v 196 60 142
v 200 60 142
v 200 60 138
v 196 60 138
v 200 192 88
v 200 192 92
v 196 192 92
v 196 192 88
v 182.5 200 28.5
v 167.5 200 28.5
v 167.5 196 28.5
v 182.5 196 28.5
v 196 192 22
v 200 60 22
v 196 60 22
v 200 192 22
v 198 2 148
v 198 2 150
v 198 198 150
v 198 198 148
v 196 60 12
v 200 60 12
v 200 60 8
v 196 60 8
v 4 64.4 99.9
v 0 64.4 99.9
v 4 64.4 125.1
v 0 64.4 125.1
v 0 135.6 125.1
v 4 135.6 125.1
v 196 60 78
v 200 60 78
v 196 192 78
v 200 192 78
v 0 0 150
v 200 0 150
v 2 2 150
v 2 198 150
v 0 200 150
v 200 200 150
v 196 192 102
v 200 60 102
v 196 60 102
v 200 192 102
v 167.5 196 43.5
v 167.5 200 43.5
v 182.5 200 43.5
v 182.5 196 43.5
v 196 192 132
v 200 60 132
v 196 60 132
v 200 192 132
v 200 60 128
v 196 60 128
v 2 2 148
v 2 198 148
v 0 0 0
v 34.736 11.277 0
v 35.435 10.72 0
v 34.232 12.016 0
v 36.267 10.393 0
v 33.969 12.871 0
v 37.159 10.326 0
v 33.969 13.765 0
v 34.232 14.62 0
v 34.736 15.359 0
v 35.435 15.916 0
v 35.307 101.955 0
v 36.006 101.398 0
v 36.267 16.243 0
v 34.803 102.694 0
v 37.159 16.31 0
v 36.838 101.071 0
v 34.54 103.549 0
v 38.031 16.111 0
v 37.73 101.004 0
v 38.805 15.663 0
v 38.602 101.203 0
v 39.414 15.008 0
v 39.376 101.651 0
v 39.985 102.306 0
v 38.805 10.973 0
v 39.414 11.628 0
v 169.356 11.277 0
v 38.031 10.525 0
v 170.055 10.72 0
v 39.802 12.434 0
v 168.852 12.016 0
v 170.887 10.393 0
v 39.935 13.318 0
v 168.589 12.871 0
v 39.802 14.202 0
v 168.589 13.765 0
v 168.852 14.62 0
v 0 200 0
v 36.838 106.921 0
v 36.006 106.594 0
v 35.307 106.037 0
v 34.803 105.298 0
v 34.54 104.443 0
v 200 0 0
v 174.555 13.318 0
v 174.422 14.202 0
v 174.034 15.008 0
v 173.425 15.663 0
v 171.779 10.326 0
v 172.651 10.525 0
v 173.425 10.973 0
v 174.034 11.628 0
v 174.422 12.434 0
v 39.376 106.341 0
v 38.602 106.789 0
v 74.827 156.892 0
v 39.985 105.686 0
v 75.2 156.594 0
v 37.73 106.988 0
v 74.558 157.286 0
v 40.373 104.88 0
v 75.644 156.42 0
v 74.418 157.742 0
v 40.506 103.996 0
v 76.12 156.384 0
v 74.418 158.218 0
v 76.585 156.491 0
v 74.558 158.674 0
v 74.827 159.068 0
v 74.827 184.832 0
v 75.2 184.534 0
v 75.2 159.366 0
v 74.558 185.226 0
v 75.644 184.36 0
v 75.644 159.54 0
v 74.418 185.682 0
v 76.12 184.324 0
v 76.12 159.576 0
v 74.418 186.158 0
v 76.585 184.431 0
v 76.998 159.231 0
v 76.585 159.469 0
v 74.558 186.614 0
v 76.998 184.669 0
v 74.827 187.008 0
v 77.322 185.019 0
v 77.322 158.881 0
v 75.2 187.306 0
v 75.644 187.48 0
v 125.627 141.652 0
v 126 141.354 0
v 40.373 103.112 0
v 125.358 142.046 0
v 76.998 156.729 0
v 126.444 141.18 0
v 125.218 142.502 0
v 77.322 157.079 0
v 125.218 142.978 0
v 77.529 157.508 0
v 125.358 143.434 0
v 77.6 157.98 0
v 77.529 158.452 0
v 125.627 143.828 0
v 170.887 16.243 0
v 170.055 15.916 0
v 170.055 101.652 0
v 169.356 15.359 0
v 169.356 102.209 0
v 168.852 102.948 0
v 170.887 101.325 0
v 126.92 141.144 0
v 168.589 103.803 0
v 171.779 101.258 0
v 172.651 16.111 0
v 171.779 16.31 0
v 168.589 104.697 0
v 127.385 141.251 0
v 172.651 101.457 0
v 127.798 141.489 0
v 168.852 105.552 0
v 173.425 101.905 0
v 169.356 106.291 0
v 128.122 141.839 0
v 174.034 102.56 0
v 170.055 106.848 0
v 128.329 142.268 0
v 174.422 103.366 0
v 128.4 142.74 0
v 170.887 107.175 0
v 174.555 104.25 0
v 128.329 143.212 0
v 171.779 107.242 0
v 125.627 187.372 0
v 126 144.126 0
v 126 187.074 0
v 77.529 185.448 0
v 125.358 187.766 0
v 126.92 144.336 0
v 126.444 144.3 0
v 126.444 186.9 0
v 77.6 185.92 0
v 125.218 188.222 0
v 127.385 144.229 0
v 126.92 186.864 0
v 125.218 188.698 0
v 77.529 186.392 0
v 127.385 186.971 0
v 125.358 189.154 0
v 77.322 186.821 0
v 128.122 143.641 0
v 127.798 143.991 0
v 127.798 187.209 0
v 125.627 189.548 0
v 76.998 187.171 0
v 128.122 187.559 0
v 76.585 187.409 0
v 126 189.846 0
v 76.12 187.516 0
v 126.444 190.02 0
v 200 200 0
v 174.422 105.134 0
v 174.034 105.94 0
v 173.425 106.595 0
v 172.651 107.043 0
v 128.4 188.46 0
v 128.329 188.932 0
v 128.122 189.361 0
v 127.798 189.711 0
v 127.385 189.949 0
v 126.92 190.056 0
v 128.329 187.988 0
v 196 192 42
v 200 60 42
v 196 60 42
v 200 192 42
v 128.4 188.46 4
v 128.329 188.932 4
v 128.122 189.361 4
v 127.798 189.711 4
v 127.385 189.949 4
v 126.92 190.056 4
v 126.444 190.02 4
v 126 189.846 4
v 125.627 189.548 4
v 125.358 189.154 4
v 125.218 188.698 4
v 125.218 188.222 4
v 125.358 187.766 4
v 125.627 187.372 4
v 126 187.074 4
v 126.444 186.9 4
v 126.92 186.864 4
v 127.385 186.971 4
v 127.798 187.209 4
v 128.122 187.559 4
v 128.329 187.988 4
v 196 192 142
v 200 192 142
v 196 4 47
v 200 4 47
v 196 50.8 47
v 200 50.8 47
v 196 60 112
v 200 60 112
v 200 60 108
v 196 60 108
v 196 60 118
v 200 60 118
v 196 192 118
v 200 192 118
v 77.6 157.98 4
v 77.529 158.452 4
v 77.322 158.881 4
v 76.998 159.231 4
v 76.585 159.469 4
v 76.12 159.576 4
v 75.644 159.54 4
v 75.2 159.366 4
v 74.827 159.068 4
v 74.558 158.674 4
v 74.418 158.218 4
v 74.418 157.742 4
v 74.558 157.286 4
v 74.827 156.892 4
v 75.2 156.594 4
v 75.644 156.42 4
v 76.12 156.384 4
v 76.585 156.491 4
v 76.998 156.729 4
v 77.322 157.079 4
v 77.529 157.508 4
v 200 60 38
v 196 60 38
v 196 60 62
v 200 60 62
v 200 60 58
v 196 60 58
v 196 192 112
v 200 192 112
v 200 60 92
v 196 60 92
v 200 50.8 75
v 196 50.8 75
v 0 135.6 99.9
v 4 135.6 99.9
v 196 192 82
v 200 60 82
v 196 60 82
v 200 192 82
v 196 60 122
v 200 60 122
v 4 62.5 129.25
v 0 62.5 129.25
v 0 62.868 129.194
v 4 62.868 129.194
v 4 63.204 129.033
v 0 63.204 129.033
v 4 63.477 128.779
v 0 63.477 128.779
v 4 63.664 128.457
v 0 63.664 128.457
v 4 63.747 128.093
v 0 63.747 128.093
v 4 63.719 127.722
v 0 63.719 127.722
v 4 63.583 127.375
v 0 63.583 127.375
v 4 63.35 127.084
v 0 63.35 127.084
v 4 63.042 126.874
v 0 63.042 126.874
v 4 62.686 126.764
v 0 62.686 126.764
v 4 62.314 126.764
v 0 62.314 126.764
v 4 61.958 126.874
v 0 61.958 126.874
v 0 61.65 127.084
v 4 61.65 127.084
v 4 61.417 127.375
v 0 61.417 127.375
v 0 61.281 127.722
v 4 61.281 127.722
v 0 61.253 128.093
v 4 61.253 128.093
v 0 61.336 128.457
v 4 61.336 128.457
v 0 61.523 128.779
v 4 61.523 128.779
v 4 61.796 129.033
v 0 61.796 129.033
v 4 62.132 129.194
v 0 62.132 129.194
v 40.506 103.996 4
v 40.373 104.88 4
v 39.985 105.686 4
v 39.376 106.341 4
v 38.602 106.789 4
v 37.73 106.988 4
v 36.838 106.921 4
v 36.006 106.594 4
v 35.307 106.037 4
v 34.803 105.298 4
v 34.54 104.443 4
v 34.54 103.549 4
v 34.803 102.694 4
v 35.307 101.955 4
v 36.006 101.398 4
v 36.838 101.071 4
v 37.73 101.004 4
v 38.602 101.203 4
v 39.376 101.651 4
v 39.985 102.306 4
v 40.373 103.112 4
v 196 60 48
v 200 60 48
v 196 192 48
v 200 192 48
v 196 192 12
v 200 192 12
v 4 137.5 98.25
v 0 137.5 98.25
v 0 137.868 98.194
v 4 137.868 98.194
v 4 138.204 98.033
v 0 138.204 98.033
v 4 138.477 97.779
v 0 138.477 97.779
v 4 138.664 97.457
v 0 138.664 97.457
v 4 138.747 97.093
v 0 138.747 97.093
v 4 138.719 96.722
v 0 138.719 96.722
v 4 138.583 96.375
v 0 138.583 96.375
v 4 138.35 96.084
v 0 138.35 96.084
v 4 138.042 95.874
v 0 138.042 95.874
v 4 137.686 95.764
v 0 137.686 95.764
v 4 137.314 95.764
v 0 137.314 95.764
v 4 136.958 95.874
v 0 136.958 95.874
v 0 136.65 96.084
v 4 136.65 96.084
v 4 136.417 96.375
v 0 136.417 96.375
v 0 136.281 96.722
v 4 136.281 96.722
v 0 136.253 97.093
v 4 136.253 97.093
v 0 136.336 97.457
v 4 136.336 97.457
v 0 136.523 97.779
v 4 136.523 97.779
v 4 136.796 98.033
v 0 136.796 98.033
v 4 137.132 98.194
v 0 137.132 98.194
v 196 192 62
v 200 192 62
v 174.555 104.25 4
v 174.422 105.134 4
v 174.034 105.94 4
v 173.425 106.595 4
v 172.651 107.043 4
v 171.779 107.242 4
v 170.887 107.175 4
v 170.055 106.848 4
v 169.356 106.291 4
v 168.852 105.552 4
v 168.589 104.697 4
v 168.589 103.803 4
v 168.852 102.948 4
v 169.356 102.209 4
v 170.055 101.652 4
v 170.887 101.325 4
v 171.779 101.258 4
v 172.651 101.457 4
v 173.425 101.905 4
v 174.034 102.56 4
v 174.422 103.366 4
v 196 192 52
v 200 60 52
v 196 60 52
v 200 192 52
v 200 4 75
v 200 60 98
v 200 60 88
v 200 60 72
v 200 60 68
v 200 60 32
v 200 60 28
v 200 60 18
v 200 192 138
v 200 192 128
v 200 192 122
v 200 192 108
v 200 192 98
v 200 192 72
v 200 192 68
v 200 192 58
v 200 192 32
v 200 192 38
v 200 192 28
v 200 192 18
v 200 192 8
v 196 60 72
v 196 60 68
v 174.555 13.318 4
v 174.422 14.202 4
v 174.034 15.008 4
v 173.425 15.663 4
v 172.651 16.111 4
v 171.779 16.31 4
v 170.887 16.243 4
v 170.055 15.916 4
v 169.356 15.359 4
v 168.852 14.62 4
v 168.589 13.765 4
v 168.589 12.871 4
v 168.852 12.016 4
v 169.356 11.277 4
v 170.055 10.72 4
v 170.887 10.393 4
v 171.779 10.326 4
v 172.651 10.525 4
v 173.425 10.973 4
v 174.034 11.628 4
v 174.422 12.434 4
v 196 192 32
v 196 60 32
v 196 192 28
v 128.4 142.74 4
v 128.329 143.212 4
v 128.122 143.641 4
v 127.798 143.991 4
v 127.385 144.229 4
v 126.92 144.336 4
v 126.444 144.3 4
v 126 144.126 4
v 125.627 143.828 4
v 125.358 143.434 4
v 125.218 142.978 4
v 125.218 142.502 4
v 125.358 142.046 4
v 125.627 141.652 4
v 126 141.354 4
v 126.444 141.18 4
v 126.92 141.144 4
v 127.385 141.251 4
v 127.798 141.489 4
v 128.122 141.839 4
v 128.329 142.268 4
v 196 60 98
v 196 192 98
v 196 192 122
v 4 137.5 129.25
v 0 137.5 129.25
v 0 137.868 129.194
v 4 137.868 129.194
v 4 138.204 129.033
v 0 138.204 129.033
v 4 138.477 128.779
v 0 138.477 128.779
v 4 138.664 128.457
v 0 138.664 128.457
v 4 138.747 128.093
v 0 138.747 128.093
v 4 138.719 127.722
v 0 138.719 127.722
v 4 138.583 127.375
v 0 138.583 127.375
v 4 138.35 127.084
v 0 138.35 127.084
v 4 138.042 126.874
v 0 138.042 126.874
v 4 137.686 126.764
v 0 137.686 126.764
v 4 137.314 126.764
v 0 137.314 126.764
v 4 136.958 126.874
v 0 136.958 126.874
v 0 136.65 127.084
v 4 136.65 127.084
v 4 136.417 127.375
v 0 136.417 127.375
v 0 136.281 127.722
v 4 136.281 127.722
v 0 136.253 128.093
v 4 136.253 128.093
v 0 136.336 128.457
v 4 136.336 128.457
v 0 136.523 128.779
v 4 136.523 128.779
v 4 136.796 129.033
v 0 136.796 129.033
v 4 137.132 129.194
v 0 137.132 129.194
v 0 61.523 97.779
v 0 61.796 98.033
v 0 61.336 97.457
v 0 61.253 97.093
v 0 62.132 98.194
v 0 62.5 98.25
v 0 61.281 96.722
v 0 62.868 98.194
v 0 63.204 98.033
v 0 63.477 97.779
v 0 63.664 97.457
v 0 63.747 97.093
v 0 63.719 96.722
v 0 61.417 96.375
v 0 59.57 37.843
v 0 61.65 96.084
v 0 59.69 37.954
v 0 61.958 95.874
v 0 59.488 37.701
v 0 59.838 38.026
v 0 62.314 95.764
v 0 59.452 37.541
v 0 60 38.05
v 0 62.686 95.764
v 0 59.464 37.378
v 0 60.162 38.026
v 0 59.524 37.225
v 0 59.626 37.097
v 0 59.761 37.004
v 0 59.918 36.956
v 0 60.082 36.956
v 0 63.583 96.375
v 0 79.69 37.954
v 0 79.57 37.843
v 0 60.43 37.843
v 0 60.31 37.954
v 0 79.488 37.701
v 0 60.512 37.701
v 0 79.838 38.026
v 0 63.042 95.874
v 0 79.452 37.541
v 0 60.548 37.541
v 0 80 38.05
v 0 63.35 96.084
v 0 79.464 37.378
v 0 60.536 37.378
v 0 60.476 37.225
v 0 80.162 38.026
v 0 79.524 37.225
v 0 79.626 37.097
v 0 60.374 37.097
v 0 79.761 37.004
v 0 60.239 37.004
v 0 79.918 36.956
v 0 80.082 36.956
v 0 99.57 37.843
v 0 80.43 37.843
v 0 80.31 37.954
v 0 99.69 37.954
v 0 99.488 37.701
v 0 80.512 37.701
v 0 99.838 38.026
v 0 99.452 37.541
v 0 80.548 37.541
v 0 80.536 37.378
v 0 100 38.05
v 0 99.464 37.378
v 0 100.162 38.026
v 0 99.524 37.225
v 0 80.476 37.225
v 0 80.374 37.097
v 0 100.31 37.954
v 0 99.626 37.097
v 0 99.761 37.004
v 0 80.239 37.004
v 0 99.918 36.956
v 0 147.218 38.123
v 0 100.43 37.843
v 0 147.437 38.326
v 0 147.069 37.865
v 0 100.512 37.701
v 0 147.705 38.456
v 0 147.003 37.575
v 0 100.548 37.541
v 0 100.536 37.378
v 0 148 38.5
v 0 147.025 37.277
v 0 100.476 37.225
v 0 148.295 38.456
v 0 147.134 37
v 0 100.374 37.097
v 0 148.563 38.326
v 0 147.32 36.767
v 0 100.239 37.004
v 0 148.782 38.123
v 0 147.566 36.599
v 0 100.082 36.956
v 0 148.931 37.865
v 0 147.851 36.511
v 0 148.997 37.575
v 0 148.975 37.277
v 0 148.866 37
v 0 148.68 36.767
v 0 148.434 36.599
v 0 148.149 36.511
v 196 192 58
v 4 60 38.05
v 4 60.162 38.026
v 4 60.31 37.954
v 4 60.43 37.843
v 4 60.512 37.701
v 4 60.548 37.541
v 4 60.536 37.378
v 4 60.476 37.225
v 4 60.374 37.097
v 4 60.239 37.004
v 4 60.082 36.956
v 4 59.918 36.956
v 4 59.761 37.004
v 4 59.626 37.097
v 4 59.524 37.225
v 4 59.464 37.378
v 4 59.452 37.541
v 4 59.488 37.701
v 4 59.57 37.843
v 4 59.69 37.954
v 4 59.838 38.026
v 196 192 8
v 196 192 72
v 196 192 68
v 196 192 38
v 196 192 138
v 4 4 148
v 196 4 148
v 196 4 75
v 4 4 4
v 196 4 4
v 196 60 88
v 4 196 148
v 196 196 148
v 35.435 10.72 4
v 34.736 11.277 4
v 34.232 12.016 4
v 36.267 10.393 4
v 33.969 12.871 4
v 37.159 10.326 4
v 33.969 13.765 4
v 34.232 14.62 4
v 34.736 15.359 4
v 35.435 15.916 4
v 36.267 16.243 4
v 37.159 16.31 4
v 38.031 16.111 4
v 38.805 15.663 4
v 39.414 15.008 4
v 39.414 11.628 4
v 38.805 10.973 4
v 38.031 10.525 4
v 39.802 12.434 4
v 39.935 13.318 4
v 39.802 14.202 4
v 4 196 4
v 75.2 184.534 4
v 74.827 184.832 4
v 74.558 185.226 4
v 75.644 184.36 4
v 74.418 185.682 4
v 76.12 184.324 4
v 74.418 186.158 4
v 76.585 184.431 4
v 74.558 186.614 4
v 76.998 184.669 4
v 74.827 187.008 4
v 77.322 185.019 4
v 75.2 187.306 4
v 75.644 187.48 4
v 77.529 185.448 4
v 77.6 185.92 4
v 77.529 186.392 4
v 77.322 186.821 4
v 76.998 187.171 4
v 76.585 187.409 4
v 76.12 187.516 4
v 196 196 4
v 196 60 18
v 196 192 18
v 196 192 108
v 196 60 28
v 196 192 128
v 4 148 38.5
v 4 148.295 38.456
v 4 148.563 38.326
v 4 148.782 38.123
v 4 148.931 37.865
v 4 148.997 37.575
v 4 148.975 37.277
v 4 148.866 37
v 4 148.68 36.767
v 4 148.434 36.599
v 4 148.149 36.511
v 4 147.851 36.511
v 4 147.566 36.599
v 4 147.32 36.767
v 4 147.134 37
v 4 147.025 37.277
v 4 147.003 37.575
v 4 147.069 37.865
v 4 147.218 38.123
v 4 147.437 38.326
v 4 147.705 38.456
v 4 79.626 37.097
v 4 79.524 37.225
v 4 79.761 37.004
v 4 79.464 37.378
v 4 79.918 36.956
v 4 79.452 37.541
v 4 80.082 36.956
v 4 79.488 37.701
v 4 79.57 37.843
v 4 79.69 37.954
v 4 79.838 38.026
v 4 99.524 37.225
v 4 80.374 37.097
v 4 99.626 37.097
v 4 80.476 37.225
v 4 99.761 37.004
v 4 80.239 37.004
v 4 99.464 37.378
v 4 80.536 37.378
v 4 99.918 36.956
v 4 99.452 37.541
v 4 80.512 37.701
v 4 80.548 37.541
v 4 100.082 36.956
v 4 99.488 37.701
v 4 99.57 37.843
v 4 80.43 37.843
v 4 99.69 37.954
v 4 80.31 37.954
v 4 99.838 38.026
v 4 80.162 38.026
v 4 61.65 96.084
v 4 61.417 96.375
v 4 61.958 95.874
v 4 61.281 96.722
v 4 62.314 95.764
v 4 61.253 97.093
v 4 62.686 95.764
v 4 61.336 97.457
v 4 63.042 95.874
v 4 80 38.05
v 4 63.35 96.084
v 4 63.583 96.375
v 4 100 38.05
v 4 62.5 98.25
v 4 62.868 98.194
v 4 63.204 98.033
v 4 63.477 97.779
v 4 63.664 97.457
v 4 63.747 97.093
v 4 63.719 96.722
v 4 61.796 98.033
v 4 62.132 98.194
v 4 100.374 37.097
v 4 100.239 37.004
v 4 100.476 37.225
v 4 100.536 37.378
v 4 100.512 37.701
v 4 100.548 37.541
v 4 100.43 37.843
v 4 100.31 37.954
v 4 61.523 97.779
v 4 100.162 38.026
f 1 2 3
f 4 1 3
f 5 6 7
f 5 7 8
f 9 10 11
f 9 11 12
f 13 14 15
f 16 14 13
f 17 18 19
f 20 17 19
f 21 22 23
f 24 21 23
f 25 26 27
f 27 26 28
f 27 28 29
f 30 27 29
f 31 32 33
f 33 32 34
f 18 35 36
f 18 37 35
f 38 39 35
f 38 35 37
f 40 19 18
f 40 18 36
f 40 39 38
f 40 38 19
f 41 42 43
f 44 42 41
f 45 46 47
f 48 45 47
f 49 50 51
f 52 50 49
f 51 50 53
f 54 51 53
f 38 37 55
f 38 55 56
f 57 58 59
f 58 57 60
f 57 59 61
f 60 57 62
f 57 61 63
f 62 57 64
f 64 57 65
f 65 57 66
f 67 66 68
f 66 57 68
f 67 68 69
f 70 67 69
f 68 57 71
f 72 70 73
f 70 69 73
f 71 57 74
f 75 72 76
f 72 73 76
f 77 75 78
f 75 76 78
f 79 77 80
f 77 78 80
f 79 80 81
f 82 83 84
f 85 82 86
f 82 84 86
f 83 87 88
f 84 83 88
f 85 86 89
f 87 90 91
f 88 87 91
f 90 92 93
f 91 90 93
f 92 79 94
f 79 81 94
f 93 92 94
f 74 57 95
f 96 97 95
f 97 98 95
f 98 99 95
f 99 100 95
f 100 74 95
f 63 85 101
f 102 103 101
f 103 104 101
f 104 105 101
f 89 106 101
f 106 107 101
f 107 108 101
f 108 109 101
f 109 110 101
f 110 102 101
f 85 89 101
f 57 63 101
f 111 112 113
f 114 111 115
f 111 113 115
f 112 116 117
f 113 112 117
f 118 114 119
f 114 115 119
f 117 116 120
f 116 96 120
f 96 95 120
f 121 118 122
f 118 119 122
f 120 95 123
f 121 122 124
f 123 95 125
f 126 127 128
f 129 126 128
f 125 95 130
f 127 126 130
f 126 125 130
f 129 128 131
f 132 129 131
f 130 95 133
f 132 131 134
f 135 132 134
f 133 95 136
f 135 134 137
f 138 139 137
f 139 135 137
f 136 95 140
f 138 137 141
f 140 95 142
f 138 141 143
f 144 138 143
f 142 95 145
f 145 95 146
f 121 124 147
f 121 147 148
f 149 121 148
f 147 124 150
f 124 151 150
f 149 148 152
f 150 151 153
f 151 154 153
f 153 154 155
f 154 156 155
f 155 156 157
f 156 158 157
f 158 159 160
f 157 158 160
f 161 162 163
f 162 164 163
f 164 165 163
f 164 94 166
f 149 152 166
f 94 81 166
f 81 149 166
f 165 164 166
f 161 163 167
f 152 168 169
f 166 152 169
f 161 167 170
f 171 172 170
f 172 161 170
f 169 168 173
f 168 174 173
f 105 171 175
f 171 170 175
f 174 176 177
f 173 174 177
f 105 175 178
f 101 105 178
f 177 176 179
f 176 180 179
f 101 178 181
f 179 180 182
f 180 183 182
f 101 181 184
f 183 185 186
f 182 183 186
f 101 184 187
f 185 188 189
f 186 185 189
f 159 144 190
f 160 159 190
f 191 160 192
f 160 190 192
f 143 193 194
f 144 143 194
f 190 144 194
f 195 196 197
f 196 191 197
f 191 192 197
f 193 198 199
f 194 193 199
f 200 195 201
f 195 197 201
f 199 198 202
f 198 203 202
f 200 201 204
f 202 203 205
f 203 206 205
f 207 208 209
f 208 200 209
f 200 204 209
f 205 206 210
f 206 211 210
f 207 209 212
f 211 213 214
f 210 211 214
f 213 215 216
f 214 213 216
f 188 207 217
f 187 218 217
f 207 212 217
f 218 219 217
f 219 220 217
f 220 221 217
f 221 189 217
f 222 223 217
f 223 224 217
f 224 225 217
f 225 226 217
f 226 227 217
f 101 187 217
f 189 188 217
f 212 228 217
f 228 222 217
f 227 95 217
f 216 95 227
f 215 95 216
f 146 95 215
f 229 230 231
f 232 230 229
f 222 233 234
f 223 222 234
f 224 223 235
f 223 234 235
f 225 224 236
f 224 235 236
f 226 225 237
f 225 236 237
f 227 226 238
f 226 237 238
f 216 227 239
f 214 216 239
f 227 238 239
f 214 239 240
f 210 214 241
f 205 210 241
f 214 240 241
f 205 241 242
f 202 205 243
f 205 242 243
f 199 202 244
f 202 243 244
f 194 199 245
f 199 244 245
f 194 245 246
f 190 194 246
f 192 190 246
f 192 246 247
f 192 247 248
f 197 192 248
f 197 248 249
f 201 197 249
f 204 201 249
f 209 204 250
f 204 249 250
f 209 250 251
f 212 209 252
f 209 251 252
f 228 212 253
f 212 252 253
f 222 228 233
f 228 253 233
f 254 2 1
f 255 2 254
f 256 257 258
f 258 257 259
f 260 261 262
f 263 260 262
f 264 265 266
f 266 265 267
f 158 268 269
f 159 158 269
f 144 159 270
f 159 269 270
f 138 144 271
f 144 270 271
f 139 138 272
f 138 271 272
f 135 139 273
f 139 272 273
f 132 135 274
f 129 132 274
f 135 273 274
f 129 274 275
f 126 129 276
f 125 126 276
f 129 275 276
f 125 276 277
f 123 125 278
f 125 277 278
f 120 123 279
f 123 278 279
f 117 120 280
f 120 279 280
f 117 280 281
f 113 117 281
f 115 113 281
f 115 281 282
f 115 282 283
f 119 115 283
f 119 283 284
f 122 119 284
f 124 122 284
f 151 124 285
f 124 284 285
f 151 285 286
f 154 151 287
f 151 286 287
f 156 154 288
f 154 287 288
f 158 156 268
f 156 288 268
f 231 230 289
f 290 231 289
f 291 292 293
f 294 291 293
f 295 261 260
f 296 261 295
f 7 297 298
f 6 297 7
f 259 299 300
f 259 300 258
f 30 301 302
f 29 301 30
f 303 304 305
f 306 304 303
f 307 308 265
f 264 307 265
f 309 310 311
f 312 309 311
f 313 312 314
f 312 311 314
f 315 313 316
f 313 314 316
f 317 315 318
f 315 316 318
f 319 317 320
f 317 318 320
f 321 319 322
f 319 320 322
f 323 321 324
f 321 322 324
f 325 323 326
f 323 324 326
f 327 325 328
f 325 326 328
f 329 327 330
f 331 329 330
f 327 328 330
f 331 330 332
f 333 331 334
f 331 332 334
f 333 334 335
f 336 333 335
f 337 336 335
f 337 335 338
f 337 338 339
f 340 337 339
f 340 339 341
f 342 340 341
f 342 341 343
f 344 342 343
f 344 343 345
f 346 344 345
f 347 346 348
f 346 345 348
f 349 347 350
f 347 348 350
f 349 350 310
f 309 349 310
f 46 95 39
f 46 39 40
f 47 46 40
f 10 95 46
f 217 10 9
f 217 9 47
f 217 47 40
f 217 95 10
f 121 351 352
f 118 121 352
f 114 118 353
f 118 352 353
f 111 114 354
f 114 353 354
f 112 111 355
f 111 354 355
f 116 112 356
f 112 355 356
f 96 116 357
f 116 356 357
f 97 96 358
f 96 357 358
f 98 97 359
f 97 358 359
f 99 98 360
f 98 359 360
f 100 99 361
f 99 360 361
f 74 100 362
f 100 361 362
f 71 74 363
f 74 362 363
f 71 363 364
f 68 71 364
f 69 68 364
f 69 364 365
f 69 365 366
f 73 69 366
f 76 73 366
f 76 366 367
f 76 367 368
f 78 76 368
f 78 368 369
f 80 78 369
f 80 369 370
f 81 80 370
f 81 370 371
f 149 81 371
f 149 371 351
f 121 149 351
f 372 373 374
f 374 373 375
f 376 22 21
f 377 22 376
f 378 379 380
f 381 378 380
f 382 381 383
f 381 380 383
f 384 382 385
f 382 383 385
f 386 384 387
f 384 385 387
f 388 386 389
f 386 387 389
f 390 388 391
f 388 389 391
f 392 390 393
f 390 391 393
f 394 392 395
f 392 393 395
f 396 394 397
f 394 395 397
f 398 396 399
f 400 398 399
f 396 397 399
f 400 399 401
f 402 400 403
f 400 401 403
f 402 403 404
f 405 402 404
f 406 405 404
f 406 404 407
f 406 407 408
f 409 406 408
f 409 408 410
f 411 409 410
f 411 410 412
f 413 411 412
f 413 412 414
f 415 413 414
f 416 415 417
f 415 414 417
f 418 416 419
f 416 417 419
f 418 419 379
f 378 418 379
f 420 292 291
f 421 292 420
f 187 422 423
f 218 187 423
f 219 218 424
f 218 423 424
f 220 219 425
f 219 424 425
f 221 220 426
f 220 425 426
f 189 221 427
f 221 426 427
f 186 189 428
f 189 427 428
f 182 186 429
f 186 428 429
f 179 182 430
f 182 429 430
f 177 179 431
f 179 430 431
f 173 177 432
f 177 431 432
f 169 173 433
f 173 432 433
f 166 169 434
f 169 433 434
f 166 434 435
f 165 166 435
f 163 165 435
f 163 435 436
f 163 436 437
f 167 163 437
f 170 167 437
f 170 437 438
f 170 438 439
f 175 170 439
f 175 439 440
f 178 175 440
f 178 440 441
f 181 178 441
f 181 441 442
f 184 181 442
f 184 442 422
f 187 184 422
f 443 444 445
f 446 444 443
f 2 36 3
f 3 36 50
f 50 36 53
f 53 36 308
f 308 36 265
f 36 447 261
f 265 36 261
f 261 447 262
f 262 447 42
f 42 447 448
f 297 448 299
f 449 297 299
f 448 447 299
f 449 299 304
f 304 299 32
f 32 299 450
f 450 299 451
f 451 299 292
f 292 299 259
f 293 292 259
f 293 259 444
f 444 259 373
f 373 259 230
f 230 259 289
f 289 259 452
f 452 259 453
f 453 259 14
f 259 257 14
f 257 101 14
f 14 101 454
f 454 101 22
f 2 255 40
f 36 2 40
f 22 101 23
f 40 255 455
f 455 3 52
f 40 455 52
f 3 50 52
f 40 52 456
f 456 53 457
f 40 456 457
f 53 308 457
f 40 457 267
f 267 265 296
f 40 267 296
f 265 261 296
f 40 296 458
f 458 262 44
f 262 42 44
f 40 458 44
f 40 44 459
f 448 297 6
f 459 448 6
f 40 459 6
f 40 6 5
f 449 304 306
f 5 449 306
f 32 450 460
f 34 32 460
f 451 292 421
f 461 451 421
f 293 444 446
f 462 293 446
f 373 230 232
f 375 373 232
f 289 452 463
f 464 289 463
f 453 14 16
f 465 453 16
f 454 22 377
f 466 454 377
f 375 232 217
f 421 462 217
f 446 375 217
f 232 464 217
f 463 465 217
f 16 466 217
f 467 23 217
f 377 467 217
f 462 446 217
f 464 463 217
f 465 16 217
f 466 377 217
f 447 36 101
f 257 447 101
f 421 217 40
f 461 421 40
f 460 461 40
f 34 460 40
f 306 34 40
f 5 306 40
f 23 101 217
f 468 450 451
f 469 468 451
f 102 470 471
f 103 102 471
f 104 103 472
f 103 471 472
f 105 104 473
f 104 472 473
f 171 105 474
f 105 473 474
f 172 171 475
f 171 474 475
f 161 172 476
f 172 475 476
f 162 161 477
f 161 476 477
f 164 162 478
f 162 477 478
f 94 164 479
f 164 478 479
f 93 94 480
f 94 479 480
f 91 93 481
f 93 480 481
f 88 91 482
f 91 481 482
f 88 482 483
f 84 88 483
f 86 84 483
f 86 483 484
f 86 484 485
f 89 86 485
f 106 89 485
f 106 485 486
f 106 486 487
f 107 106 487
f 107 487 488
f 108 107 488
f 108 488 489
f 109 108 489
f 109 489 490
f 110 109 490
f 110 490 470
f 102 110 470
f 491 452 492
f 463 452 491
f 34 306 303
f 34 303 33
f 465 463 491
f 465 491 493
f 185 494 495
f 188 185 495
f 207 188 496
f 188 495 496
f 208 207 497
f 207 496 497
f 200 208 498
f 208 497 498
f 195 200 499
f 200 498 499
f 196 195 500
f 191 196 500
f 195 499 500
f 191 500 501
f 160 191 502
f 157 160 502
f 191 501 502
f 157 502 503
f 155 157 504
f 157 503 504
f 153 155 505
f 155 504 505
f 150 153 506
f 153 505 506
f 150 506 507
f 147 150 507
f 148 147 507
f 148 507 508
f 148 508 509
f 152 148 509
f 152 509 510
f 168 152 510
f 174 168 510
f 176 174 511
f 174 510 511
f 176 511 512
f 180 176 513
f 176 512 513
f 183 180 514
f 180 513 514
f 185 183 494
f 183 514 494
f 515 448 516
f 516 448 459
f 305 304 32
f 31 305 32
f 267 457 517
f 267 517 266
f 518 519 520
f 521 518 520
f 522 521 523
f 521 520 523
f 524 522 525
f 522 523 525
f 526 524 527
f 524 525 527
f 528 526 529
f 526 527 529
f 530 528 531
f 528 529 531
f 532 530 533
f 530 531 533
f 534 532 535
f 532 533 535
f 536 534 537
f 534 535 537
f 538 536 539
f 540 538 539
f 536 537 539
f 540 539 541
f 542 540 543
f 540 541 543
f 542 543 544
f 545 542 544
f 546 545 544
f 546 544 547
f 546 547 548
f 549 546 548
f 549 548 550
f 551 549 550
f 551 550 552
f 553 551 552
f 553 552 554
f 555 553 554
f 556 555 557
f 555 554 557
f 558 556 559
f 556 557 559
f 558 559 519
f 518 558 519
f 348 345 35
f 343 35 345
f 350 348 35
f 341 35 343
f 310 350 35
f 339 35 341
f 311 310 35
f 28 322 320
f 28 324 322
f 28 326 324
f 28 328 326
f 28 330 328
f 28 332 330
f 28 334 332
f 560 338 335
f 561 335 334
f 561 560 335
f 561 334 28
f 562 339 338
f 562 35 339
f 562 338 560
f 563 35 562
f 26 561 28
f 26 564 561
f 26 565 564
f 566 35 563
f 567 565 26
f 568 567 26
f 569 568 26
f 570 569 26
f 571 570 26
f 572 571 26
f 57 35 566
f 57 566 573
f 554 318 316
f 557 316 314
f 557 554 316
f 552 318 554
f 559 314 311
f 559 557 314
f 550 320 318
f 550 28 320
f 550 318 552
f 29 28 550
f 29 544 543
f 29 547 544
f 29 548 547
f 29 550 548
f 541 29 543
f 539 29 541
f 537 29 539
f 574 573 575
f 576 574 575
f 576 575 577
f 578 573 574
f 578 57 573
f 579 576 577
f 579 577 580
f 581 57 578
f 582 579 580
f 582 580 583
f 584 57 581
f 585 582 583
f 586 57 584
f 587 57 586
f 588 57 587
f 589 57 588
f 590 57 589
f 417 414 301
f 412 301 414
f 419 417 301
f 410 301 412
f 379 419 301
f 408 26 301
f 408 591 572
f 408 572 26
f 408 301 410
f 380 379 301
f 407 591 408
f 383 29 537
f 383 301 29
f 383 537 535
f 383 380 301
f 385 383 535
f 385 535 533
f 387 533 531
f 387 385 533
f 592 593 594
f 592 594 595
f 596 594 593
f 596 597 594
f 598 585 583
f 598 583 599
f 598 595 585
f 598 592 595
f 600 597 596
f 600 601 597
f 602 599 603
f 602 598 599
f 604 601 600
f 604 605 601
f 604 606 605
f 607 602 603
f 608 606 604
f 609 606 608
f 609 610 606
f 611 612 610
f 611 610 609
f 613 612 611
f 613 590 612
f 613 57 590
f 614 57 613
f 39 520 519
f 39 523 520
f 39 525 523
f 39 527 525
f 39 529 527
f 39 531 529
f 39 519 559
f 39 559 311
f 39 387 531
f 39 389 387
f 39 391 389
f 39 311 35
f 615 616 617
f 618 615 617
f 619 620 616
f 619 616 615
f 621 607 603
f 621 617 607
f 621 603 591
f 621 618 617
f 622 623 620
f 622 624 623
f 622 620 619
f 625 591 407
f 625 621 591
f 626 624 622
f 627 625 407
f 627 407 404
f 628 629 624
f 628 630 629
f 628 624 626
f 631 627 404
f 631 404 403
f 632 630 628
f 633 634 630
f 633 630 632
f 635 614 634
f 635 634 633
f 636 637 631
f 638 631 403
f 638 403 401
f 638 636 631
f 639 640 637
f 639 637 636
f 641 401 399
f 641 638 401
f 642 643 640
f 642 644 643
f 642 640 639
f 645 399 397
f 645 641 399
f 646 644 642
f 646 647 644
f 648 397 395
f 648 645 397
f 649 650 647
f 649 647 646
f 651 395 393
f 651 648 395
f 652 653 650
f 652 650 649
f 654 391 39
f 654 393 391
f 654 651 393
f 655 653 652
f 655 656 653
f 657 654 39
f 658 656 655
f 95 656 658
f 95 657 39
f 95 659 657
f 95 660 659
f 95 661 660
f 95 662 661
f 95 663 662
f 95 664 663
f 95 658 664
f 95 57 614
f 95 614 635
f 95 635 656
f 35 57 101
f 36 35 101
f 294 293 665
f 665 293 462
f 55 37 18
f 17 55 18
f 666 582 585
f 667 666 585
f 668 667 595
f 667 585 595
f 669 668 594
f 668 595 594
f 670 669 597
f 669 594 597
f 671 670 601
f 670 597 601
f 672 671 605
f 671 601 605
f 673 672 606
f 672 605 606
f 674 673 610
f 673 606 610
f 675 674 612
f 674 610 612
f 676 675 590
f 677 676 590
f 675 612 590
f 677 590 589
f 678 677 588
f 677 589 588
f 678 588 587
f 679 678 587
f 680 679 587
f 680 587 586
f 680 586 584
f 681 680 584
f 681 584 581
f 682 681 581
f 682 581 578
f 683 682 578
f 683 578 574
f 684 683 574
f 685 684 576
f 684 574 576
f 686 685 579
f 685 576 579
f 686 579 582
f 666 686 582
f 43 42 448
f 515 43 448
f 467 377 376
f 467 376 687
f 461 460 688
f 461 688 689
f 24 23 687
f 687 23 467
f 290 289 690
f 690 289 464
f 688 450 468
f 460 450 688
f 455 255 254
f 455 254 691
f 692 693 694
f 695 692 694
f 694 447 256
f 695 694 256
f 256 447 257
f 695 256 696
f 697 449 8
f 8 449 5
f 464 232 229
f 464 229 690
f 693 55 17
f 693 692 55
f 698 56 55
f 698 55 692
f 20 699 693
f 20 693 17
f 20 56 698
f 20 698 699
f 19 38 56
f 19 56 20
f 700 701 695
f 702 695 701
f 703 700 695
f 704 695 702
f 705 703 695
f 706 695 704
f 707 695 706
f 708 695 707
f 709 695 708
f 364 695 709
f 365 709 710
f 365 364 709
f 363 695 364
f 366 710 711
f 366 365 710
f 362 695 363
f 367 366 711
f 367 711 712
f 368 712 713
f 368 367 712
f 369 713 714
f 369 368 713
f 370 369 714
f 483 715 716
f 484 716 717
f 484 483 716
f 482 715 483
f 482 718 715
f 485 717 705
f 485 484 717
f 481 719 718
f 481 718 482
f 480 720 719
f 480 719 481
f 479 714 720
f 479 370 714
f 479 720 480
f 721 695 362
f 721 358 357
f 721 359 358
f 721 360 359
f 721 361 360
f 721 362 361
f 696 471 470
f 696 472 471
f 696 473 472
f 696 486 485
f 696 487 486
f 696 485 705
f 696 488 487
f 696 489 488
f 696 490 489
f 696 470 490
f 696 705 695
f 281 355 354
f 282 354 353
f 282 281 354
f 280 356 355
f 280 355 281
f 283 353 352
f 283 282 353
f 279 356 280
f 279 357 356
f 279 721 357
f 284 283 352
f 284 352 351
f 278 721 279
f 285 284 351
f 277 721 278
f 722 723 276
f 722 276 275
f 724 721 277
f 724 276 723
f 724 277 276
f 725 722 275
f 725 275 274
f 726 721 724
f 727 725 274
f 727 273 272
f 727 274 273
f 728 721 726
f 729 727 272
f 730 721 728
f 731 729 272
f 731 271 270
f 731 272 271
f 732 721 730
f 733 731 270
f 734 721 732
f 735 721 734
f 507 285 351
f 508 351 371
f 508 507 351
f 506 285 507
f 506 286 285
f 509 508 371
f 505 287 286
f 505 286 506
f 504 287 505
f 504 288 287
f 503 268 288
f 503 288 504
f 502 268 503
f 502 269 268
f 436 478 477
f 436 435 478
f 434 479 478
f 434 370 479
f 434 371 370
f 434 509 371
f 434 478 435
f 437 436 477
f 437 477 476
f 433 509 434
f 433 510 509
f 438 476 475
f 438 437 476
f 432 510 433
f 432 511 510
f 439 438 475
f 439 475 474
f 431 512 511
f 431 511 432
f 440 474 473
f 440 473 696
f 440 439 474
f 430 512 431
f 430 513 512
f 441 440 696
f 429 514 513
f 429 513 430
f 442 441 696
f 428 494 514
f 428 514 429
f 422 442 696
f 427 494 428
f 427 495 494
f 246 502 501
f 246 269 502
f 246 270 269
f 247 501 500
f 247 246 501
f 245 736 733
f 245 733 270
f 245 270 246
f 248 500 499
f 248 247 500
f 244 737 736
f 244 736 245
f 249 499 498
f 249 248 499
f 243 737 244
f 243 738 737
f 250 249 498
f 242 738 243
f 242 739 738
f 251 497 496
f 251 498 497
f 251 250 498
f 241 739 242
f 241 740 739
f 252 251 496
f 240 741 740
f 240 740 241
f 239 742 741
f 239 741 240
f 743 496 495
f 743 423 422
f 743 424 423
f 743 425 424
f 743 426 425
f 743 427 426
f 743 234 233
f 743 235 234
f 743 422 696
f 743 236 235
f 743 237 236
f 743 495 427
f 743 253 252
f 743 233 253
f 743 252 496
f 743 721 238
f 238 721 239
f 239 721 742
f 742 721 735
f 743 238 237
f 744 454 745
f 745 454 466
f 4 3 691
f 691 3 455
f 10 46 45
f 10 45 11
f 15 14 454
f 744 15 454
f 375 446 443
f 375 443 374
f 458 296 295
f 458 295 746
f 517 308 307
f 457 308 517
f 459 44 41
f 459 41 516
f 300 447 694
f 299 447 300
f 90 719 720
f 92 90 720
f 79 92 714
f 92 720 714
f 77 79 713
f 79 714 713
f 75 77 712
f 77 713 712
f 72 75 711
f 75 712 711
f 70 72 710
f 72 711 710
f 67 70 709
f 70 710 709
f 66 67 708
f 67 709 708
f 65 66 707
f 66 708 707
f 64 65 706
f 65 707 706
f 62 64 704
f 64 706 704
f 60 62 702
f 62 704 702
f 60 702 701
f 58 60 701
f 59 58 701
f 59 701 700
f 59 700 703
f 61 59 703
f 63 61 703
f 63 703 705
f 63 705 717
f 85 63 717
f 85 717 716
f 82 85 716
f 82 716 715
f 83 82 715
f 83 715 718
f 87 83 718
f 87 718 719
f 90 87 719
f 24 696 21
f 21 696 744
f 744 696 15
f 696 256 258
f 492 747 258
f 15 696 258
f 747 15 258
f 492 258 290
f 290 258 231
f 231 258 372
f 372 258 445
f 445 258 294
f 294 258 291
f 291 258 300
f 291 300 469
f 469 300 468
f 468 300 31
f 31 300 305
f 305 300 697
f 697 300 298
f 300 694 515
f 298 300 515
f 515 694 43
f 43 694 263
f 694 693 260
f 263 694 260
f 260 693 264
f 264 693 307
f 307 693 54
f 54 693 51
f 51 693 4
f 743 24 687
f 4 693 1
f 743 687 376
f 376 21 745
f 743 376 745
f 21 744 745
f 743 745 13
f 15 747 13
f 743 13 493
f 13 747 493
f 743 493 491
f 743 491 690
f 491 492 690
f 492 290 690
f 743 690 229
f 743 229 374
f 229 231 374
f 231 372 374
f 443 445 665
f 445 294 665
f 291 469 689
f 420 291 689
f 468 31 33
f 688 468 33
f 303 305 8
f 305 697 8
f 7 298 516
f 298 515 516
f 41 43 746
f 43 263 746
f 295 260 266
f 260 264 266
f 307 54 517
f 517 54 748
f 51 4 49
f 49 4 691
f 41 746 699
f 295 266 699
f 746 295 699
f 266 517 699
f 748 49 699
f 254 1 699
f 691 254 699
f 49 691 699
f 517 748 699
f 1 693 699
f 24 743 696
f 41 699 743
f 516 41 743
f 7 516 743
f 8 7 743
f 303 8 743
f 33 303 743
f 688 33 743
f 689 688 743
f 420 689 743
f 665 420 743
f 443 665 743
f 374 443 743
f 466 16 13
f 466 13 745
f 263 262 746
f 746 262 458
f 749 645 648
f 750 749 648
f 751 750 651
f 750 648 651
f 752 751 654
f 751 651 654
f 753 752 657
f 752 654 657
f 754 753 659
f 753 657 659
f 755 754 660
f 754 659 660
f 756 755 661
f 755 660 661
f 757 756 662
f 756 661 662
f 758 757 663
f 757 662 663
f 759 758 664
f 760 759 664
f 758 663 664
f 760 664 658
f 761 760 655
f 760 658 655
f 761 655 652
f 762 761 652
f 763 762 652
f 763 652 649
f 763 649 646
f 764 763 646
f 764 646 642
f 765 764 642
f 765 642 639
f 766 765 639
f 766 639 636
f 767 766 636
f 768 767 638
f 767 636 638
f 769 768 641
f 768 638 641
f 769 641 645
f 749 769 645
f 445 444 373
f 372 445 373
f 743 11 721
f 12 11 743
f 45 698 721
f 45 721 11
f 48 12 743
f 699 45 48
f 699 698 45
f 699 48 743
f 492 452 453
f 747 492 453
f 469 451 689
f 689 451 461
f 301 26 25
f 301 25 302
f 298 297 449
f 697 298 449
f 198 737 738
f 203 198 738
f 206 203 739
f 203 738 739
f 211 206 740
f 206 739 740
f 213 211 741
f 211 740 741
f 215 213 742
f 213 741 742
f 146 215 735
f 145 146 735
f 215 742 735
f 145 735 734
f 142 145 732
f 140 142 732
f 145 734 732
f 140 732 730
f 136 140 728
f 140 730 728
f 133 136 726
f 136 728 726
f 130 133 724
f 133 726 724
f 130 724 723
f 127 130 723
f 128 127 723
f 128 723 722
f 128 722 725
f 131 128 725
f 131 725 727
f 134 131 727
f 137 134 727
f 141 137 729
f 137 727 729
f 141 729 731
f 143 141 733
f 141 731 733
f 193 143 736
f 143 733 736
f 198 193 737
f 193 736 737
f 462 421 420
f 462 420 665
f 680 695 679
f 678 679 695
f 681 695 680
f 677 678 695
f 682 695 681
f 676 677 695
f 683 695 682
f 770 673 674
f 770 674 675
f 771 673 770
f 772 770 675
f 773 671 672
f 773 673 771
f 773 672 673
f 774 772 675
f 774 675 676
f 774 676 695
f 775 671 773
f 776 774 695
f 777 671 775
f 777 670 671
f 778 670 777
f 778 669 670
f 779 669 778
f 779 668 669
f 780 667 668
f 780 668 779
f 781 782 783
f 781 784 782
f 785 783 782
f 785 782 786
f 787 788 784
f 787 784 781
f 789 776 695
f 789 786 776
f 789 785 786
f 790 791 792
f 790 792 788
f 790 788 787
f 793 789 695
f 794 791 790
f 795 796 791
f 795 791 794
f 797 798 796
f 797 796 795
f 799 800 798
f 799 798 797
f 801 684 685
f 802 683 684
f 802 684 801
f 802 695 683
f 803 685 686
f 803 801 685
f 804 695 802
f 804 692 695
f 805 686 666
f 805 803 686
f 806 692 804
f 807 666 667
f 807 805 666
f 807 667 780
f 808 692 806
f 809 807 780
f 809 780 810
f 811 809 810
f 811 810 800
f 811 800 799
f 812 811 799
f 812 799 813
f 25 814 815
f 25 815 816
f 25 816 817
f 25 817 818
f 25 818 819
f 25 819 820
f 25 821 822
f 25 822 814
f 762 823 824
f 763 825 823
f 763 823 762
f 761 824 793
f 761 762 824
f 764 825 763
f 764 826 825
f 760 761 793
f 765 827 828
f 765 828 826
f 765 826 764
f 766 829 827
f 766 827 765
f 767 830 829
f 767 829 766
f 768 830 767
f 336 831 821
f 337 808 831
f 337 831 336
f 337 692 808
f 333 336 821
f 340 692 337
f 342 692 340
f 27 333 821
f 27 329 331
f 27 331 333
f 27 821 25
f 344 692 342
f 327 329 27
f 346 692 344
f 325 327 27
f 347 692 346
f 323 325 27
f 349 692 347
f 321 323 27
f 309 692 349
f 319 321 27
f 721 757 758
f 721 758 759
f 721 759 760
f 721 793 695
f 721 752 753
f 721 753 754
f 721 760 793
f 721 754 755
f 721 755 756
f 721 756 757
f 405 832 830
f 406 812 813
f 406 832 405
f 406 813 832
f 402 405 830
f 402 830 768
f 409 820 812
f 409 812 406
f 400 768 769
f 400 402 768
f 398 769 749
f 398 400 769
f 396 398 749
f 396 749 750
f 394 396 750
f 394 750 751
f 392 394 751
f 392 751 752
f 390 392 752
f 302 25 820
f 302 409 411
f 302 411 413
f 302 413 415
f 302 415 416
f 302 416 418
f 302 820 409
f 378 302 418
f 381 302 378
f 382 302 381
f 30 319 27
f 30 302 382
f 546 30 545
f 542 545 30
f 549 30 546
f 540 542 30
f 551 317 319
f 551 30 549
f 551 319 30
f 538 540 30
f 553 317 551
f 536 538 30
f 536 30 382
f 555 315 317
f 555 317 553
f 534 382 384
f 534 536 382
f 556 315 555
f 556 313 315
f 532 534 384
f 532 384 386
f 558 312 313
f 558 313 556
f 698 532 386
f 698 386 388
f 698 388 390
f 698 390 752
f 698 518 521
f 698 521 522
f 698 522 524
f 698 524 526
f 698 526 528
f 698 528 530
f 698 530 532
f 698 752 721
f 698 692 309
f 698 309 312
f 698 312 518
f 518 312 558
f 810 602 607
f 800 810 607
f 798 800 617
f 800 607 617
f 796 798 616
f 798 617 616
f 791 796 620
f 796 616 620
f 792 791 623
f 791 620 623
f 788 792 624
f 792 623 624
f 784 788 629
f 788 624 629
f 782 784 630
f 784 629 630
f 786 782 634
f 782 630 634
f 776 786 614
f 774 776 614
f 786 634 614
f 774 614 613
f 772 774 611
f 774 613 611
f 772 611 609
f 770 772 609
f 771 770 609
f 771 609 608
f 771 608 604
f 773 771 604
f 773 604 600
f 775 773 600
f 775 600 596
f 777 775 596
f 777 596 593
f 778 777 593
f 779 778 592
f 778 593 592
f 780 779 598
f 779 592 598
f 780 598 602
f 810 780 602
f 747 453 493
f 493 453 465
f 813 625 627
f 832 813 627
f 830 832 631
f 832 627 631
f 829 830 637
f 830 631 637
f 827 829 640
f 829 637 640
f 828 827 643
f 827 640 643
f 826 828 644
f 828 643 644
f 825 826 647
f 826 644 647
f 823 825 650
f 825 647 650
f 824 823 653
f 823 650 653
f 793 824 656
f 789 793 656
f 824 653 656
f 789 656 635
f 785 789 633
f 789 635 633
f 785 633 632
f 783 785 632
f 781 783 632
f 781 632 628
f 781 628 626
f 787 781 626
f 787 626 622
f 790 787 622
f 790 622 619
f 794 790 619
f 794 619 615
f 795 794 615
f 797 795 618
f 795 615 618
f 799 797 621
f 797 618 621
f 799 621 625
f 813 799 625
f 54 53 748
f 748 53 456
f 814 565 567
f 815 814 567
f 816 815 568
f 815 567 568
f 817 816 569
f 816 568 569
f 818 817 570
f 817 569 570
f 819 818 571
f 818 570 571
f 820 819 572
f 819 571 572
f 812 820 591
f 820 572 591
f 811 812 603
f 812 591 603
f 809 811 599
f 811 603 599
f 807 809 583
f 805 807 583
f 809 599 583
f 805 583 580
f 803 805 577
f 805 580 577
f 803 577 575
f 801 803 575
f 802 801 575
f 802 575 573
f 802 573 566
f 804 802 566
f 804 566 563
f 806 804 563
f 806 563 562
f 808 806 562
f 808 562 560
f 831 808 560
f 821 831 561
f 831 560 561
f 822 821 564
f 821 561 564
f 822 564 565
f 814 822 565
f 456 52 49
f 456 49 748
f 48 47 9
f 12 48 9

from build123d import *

# Parameters (mm, degrees)
SKETCH4_W                = 200
SKETCH4_H                = 200
BOSS_EXTRUDE1_DEPTH      = 150
SKETCH6_W                = 196
SKETCH6_H                = 196
CUT_EXTRUDE1_DEPTH       = 2
SKETCH7_W                = 192
SKETCH7_H                = 192
CUT_EXTRUDE2_DEPTH       = 92
SKETCH9_W                = 28
SKETCH9_H                = 46.8
INLET_DEPTH              = 4
SKETCH13_W               = 4
SKETCH13_H               = 132
AIRFLOW_DEPTH            = 4
SKETCH11_W               = 25.2
SKETCH11_H               = 71.2
CUT_EXTRUDE5_DEPTH       = 4
SKETCH11_4_R             = 1.25
LCD_MOUNTING_DEPTH       = 4
SKETCH12_R               = 0.55
SKETCH12_R_2             = 1
POST_KNOB_MOUNTING_DEPTH = 4
SKETCH14_R               = 3
CUT_EXTRUDE10_DEPTH      = 56
SKETCH17_W               = 192
SKETCH17_H               = 192
CUT_EXTRUDE11_DEPTH      = 52
SKETCH18_R               = 1.6
CUT_EXTRUDE12_DEPTH      = 4
SKETCH20_W               = 15
SKETCH20_H               = 15
CUT_EXTRUDE13_DEPTH      = 4


with BuildPart() as part:
    # Sketch4 → Boss-Extrude1 (new body)
    with BuildSketch(Plane.XY):
        with Locations((100, 100)):
            Rectangle(SKETCH4_W, SKETCH4_H)
    extrude(amount=BOSS_EXTRUDE1_DEPTH)

    # Sketch6 → Cut-Extrude1 (cut)
    with BuildSketch(Plane.XY.offset(150)):
        with Locations((100, 100)):
            Rectangle(SKETCH6_W, SKETCH6_H)
    extrude(amount=-CUT_EXTRUDE1_DEPTH, mode=Mode.SUBTRACT)

    # Sketch7 → Cut-Extrude2 (cut)
    with BuildSketch(Plane.XY.offset(148)):
        with Locations((100, 100)):
            Rectangle(SKETCH7_W, SKETCH7_H)
    extrude(amount=-CUT_EXTRUDE2_DEPTH, mode=Mode.SUBTRACT)

    # Sketch9 → Inlet (cut)
    with BuildSketch(Plane(origin=(200, 0, 0), x_dir=(0, 0, -1), z_dir=(1, 0, 0))):
        with Locations((-61, 27.4)):
            Rectangle(SKETCH9_W, SKETCH9_H)
    extrude(amount=-INLET_DEPTH, mode=Mode.SUBTRACT)

    # Sketch13 → Airflow (cut)
    with BuildSketch(Plane(origin=(200, 0, 0), x_dir=(0, 0, -1), z_dir=(1, 0, 0))):
        with Locations((-10, 126)):
            Rectangle(SKETCH13_W, SKETCH13_H)
        with Locations((-20, 126)):
            Rectangle(SKETCH13_W, SKETCH13_H)
        with Locations((-30, 126)):
            Rectangle(SKETCH13_W, SKETCH13_H)
        with Locations((-40, 126)):
            Rectangle(SKETCH13_W, SKETCH13_H)
        with Locations((-50, 126)):
            Rectangle(SKETCH13_W, SKETCH13_H)
        with Locations((-60, 126)):
            Rectangle(SKETCH13_W, SKETCH13_H)
        with Locations((-70, 126)):
            Rectangle(SKETCH13_W, SKETCH13_H)
        with Locations((-80, 126)):
            Rectangle(SKETCH13_W, SKETCH13_H)
        with Locations((-90, 126)):
            Rectangle(SKETCH13_W, SKETCH13_H)
        with Locations((-100, 126)):
            Rectangle(SKETCH13_W, SKETCH13_H)
        with Locations((-110, 126)):
            Rectangle(SKETCH13_W, SKETCH13_H)
        with Locations((-120, 126)):
            Rectangle(SKETCH13_W, SKETCH13_H)
        with Locations((-130, 126)):
            Rectangle(SKETCH13_W, SKETCH13_H)
        with Locations((-140, 126)):
            Rectangle(SKETCH13_W, SKETCH13_H)
    extrude(amount=-AIRFLOW_DEPTH, mode=Mode.SUBTRACT)

    # Sketch11 → Cut-Extrude5 (cut)
    with BuildSketch(Plane.ZY):
        with Locations((112.5, 100)):
            Rectangle(SKETCH11_W, SKETCH11_H)
    extrude(amount=-CUT_EXTRUDE5_DEPTH, mode=Mode.SUBTRACT)

    # Sketch11<4> → LCD/Mounting (cut)
    with BuildSketch(Plane.ZY):
        with Locations((128, 137.5)):
            Circle(SKETCH11_4_R)
        with Locations((97, 137.5)):
            Circle(SKETCH11_4_R)
        with Locations((97, 62.5)):
            Circle(SKETCH11_4_R)
        with Locations((128, 62.5)):
            Circle(SKETCH11_4_R)
    extrude(amount=-LCD_MOUNTING_DEPTH, mode=Mode.SUBTRACT)

    # Sketch12 → Post/Knob Mounting (cut)
    with BuildSketch(Plane.ZY):
        with Locations((37.5, 100)):
            Circle(SKETCH12_R)
        with Locations((37.5, 80)):
            Circle(SKETCH12_R)
        with Locations((37.5, 60)):
            Circle(SKETCH12_R)
        with Locations((37.5, 148)):
            Circle(SKETCH12_R_2)
    extrude(amount=-POST_KNOB_MOUNTING_DEPTH, mode=Mode.SUBTRACT)

    # Sketch14 → Cut-Extrude10 (cut)
    with BuildSketch(Plane.XY.offset(56)):
        with Locations((37.506, 103.996)):
            Circle(SKETCH14_R)
        with Locations((171.555, 104.25)):
            Circle(SKETCH14_R)
        with Locations((36.935, 13.318)):
            Circle(SKETCH14_R)
        with Locations((171.555, 13.318)):
            Circle(SKETCH14_R)
    extrude(amount=-CUT_EXTRUDE10_DEPTH, mode=Mode.SUBTRACT)

    # Sketch17 → Cut-Extrude11 (cut)
    with BuildSketch(Plane.XY.offset(56)):
        with Locations((100, 100)):
            Rectangle(SKETCH17_W, SKETCH17_H)
    extrude(amount=-CUT_EXTRUDE11_DEPTH, mode=Mode.SUBTRACT)

    # Sketch18 → Cut-Extrude12 (cut)
    with BuildSketch(Plane.XY.offset(4)):
        with Locations((126.8, 188.46)):
            Circle(SKETCH18_R)
        with Locations((126.8, 142.74)):
            Circle(SKETCH18_R)
        with Locations((76, 157.98)):
            Circle(SKETCH18_R)
        with Locations((76, 185.92)):
            Circle(SKETCH18_R)
    extrude(amount=-CUT_EXTRUDE12_DEPTH, mode=Mode.SUBTRACT)

    # Sketch20 → Cut-Extrude13 (cut)
    with BuildSketch(Plane(origin=(0, 200, 0), x_dir=(1, 0, 0), z_dir=(0, 1, 0))):
        with Locations((175, -36)):
            Rectangle(SKETCH20_W, SKETCH20_H)
    extrude(amount=-CUT_EXTRUDE13_DEPTH, mode=Mode.SUBTRACT)


solid = part.part
